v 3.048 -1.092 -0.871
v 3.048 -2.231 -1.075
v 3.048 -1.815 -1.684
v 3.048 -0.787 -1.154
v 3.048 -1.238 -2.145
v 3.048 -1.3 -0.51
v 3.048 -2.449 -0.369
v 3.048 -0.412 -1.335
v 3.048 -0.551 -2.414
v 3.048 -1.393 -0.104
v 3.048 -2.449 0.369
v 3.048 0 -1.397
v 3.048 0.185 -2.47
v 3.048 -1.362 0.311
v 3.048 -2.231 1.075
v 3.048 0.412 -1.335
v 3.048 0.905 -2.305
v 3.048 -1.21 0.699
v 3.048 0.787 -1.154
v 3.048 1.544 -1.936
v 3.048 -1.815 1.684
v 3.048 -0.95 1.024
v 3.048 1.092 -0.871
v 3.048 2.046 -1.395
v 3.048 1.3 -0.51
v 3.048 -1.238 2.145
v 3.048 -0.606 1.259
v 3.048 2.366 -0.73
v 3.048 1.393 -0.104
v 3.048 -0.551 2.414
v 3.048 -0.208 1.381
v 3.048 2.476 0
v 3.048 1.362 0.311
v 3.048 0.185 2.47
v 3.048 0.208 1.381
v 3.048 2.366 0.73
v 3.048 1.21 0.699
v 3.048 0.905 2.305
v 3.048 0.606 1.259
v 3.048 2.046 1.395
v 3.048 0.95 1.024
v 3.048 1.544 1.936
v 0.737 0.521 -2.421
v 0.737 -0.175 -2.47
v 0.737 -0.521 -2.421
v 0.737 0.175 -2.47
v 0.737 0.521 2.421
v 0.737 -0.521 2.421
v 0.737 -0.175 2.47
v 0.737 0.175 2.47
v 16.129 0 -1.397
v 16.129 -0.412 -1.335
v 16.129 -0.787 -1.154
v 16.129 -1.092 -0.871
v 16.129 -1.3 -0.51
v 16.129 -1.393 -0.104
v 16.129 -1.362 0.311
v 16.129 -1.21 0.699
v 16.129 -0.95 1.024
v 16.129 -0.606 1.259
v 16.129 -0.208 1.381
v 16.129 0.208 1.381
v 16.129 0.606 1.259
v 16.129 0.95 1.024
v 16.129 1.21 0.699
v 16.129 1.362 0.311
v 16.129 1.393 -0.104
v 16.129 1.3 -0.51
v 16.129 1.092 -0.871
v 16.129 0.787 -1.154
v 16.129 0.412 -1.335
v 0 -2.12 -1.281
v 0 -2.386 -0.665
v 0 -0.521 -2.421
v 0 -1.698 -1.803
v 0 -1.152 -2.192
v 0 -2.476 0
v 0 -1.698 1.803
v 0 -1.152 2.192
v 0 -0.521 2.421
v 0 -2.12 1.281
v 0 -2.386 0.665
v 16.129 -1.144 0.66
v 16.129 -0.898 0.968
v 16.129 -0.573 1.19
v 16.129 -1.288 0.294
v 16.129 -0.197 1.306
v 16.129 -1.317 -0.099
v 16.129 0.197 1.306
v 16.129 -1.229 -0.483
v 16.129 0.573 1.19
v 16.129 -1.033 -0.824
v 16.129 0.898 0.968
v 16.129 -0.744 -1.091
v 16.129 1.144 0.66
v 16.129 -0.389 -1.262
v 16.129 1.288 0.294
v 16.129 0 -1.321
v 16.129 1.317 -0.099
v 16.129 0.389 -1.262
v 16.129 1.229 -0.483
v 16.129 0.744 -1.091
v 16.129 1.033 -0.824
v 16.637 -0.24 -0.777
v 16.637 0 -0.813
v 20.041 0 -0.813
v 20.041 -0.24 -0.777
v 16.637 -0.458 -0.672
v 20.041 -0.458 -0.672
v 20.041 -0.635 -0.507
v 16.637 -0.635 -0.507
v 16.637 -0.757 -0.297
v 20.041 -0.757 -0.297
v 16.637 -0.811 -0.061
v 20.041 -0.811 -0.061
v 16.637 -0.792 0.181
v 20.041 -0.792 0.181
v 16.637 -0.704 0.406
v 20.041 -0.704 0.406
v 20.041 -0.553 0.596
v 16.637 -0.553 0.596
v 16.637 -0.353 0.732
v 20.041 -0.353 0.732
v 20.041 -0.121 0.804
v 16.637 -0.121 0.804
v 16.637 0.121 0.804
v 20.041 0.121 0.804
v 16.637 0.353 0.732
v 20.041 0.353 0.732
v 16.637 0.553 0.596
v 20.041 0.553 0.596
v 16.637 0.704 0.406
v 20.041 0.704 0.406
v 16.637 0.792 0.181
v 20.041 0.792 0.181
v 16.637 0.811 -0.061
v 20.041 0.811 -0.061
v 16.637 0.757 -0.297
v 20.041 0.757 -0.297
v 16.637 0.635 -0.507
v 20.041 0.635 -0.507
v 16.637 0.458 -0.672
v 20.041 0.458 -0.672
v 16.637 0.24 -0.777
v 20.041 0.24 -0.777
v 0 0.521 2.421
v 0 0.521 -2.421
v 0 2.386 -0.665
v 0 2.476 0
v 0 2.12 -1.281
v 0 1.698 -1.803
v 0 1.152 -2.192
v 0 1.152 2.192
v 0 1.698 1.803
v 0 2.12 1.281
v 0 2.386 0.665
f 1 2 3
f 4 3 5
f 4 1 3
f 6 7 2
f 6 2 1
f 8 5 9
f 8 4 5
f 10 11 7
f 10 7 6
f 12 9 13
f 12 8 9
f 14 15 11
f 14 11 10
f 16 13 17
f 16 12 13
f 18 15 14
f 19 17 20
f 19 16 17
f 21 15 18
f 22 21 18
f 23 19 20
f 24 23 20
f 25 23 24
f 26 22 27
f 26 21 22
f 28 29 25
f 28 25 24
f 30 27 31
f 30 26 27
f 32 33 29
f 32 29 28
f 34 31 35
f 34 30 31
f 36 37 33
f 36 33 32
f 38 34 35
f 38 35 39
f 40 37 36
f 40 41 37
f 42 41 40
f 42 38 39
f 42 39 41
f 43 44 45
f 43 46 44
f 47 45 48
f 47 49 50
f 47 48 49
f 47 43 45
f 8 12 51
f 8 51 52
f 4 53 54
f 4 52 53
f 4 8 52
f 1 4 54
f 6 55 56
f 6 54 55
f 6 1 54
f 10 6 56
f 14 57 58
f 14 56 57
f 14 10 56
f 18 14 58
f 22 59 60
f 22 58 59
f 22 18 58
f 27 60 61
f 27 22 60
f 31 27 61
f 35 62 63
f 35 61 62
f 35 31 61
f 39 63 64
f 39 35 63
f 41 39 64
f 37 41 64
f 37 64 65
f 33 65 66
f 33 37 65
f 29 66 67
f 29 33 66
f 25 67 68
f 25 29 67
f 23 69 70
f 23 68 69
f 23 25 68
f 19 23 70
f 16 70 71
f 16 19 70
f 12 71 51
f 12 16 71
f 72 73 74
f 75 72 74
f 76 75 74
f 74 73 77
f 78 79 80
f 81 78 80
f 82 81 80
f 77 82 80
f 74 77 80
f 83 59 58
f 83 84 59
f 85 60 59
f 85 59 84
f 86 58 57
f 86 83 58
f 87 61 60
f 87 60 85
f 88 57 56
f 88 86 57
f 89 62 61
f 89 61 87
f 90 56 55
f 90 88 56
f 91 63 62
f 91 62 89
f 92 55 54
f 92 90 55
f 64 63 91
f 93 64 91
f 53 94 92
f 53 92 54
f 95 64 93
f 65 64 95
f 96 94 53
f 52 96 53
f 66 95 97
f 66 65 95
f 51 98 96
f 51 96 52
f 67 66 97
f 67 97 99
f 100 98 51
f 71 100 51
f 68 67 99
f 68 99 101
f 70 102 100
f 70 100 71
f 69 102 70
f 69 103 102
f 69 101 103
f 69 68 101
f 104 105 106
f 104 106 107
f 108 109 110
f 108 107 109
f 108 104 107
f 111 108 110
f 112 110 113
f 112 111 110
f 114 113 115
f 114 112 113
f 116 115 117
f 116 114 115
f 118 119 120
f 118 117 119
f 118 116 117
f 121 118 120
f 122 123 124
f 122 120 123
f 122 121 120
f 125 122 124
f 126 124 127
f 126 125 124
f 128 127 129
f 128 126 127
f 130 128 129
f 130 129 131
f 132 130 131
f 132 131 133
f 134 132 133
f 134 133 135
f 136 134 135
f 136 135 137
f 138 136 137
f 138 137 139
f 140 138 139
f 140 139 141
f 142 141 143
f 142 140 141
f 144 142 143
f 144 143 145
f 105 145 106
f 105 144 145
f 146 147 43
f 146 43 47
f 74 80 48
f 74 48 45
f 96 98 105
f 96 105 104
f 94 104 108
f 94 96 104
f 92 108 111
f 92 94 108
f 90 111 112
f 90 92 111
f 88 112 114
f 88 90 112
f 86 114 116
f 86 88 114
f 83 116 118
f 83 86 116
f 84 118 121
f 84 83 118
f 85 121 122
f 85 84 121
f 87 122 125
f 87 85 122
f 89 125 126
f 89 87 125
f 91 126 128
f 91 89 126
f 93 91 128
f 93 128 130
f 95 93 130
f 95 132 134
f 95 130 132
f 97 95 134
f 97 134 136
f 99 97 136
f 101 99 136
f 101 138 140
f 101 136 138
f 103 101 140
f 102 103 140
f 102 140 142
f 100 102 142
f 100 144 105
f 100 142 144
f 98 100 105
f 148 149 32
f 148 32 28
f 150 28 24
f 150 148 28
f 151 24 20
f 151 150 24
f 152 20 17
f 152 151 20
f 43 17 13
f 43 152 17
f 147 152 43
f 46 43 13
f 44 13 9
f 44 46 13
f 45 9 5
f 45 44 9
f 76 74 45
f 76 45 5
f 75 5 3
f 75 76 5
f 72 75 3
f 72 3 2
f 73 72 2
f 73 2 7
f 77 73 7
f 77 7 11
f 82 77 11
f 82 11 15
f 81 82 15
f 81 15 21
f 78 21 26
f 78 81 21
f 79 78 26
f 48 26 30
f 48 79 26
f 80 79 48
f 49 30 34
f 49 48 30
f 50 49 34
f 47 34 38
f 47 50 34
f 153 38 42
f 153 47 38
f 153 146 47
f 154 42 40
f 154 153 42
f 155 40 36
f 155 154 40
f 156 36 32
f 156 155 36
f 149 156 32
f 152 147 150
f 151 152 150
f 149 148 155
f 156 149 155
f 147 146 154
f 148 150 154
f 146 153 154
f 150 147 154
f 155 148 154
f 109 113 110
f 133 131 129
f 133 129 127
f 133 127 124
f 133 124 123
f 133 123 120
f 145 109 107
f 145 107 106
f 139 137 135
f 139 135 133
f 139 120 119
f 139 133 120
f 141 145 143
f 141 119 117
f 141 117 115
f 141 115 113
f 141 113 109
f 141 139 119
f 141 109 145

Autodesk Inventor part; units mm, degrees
ref_plane "YZ Plane" through (0, 0, 0) normal (1, 0, 0) x (0, 1, 0)
ref_plane "XZ Plane" through (0, 0, 0) normal (0, 1, 0) x (-1, 0, 0)
ref_plane "XY Plane" through (0, 0, 0) normal (0, 0, 1) x (1, 0, 0)
sketch "Sketch1" plane through (0, 0, 0) normal (1, 0, 0) x (0, 1, 0)
  circle A0 centre (0, 0) radius 2.4765
  dimension "d1" = 4.953
extrude "Extrusion1" add sketch "Sketch1" along normal blind 3.048
sketch "Sketch2" plane through (3.048, 0, 0) normal (1, 0, 0) x (0, 0, -1)
  circle A0 centre (0, 0) radius 2.4765 projected
  circle A1 centre (0, 0) radius 1.397
  dimension "d5" = 2.794
extrude "Extrusion2" add sketch "Sketch2" along normal blind 13.081 contours A1
sketch "Sketch3" plane through (16.129, 0, 0) normal (1, 0, 0) x (0, 0, -1)
  circle A0 centre (0, 0) radius 1.397 projected
  circle A1 centre (0, 0) radius 0.8128
  dimension "d8" = 1.6256
extrude "Extrusion3" add sketch "Sketch3" along normal blind 3.9116 contours A1
chamfer "Chamfer1" distance 0.508 angle 45 1 edges at (16.129, 0, 0.8128)
thread "Thread1" size "4-40 UNC" class "2A" standard "ANSI Unified Screw Threads" full length
sketch "Sketch4" plane through (0, 0, 0) normal (-1, 0, 0) x (0, 0, 1)
  circle A0 centre (0, 0) radius 2.4765 projected
  line L0 (-2.4765, 0.5207) -> (2.4765, 0.5207)
  line L1 (2.4765, 0.5207) -> (2.4765, -0.5207)
  line L2 (2.4765, -0.5207) -> (-2.4765, -0.5207)
  line L3 (-2.4765, -0.5207) -> (-2.4765, 0.5207)
  dimension "d16" = 1.0414
  dimension "d18" = 0.5207
extrude "Extrusion4" cut sketch "Sketch4" against normal blind 0.7366 contours A0 L2 L0 | L1 L2 A0 | A0 L0 L1 | A0 L3 L0 | L2 L3 A0
equation "\"d18\" = 0.5 * d16"
properties part number "Air Adjuster"
